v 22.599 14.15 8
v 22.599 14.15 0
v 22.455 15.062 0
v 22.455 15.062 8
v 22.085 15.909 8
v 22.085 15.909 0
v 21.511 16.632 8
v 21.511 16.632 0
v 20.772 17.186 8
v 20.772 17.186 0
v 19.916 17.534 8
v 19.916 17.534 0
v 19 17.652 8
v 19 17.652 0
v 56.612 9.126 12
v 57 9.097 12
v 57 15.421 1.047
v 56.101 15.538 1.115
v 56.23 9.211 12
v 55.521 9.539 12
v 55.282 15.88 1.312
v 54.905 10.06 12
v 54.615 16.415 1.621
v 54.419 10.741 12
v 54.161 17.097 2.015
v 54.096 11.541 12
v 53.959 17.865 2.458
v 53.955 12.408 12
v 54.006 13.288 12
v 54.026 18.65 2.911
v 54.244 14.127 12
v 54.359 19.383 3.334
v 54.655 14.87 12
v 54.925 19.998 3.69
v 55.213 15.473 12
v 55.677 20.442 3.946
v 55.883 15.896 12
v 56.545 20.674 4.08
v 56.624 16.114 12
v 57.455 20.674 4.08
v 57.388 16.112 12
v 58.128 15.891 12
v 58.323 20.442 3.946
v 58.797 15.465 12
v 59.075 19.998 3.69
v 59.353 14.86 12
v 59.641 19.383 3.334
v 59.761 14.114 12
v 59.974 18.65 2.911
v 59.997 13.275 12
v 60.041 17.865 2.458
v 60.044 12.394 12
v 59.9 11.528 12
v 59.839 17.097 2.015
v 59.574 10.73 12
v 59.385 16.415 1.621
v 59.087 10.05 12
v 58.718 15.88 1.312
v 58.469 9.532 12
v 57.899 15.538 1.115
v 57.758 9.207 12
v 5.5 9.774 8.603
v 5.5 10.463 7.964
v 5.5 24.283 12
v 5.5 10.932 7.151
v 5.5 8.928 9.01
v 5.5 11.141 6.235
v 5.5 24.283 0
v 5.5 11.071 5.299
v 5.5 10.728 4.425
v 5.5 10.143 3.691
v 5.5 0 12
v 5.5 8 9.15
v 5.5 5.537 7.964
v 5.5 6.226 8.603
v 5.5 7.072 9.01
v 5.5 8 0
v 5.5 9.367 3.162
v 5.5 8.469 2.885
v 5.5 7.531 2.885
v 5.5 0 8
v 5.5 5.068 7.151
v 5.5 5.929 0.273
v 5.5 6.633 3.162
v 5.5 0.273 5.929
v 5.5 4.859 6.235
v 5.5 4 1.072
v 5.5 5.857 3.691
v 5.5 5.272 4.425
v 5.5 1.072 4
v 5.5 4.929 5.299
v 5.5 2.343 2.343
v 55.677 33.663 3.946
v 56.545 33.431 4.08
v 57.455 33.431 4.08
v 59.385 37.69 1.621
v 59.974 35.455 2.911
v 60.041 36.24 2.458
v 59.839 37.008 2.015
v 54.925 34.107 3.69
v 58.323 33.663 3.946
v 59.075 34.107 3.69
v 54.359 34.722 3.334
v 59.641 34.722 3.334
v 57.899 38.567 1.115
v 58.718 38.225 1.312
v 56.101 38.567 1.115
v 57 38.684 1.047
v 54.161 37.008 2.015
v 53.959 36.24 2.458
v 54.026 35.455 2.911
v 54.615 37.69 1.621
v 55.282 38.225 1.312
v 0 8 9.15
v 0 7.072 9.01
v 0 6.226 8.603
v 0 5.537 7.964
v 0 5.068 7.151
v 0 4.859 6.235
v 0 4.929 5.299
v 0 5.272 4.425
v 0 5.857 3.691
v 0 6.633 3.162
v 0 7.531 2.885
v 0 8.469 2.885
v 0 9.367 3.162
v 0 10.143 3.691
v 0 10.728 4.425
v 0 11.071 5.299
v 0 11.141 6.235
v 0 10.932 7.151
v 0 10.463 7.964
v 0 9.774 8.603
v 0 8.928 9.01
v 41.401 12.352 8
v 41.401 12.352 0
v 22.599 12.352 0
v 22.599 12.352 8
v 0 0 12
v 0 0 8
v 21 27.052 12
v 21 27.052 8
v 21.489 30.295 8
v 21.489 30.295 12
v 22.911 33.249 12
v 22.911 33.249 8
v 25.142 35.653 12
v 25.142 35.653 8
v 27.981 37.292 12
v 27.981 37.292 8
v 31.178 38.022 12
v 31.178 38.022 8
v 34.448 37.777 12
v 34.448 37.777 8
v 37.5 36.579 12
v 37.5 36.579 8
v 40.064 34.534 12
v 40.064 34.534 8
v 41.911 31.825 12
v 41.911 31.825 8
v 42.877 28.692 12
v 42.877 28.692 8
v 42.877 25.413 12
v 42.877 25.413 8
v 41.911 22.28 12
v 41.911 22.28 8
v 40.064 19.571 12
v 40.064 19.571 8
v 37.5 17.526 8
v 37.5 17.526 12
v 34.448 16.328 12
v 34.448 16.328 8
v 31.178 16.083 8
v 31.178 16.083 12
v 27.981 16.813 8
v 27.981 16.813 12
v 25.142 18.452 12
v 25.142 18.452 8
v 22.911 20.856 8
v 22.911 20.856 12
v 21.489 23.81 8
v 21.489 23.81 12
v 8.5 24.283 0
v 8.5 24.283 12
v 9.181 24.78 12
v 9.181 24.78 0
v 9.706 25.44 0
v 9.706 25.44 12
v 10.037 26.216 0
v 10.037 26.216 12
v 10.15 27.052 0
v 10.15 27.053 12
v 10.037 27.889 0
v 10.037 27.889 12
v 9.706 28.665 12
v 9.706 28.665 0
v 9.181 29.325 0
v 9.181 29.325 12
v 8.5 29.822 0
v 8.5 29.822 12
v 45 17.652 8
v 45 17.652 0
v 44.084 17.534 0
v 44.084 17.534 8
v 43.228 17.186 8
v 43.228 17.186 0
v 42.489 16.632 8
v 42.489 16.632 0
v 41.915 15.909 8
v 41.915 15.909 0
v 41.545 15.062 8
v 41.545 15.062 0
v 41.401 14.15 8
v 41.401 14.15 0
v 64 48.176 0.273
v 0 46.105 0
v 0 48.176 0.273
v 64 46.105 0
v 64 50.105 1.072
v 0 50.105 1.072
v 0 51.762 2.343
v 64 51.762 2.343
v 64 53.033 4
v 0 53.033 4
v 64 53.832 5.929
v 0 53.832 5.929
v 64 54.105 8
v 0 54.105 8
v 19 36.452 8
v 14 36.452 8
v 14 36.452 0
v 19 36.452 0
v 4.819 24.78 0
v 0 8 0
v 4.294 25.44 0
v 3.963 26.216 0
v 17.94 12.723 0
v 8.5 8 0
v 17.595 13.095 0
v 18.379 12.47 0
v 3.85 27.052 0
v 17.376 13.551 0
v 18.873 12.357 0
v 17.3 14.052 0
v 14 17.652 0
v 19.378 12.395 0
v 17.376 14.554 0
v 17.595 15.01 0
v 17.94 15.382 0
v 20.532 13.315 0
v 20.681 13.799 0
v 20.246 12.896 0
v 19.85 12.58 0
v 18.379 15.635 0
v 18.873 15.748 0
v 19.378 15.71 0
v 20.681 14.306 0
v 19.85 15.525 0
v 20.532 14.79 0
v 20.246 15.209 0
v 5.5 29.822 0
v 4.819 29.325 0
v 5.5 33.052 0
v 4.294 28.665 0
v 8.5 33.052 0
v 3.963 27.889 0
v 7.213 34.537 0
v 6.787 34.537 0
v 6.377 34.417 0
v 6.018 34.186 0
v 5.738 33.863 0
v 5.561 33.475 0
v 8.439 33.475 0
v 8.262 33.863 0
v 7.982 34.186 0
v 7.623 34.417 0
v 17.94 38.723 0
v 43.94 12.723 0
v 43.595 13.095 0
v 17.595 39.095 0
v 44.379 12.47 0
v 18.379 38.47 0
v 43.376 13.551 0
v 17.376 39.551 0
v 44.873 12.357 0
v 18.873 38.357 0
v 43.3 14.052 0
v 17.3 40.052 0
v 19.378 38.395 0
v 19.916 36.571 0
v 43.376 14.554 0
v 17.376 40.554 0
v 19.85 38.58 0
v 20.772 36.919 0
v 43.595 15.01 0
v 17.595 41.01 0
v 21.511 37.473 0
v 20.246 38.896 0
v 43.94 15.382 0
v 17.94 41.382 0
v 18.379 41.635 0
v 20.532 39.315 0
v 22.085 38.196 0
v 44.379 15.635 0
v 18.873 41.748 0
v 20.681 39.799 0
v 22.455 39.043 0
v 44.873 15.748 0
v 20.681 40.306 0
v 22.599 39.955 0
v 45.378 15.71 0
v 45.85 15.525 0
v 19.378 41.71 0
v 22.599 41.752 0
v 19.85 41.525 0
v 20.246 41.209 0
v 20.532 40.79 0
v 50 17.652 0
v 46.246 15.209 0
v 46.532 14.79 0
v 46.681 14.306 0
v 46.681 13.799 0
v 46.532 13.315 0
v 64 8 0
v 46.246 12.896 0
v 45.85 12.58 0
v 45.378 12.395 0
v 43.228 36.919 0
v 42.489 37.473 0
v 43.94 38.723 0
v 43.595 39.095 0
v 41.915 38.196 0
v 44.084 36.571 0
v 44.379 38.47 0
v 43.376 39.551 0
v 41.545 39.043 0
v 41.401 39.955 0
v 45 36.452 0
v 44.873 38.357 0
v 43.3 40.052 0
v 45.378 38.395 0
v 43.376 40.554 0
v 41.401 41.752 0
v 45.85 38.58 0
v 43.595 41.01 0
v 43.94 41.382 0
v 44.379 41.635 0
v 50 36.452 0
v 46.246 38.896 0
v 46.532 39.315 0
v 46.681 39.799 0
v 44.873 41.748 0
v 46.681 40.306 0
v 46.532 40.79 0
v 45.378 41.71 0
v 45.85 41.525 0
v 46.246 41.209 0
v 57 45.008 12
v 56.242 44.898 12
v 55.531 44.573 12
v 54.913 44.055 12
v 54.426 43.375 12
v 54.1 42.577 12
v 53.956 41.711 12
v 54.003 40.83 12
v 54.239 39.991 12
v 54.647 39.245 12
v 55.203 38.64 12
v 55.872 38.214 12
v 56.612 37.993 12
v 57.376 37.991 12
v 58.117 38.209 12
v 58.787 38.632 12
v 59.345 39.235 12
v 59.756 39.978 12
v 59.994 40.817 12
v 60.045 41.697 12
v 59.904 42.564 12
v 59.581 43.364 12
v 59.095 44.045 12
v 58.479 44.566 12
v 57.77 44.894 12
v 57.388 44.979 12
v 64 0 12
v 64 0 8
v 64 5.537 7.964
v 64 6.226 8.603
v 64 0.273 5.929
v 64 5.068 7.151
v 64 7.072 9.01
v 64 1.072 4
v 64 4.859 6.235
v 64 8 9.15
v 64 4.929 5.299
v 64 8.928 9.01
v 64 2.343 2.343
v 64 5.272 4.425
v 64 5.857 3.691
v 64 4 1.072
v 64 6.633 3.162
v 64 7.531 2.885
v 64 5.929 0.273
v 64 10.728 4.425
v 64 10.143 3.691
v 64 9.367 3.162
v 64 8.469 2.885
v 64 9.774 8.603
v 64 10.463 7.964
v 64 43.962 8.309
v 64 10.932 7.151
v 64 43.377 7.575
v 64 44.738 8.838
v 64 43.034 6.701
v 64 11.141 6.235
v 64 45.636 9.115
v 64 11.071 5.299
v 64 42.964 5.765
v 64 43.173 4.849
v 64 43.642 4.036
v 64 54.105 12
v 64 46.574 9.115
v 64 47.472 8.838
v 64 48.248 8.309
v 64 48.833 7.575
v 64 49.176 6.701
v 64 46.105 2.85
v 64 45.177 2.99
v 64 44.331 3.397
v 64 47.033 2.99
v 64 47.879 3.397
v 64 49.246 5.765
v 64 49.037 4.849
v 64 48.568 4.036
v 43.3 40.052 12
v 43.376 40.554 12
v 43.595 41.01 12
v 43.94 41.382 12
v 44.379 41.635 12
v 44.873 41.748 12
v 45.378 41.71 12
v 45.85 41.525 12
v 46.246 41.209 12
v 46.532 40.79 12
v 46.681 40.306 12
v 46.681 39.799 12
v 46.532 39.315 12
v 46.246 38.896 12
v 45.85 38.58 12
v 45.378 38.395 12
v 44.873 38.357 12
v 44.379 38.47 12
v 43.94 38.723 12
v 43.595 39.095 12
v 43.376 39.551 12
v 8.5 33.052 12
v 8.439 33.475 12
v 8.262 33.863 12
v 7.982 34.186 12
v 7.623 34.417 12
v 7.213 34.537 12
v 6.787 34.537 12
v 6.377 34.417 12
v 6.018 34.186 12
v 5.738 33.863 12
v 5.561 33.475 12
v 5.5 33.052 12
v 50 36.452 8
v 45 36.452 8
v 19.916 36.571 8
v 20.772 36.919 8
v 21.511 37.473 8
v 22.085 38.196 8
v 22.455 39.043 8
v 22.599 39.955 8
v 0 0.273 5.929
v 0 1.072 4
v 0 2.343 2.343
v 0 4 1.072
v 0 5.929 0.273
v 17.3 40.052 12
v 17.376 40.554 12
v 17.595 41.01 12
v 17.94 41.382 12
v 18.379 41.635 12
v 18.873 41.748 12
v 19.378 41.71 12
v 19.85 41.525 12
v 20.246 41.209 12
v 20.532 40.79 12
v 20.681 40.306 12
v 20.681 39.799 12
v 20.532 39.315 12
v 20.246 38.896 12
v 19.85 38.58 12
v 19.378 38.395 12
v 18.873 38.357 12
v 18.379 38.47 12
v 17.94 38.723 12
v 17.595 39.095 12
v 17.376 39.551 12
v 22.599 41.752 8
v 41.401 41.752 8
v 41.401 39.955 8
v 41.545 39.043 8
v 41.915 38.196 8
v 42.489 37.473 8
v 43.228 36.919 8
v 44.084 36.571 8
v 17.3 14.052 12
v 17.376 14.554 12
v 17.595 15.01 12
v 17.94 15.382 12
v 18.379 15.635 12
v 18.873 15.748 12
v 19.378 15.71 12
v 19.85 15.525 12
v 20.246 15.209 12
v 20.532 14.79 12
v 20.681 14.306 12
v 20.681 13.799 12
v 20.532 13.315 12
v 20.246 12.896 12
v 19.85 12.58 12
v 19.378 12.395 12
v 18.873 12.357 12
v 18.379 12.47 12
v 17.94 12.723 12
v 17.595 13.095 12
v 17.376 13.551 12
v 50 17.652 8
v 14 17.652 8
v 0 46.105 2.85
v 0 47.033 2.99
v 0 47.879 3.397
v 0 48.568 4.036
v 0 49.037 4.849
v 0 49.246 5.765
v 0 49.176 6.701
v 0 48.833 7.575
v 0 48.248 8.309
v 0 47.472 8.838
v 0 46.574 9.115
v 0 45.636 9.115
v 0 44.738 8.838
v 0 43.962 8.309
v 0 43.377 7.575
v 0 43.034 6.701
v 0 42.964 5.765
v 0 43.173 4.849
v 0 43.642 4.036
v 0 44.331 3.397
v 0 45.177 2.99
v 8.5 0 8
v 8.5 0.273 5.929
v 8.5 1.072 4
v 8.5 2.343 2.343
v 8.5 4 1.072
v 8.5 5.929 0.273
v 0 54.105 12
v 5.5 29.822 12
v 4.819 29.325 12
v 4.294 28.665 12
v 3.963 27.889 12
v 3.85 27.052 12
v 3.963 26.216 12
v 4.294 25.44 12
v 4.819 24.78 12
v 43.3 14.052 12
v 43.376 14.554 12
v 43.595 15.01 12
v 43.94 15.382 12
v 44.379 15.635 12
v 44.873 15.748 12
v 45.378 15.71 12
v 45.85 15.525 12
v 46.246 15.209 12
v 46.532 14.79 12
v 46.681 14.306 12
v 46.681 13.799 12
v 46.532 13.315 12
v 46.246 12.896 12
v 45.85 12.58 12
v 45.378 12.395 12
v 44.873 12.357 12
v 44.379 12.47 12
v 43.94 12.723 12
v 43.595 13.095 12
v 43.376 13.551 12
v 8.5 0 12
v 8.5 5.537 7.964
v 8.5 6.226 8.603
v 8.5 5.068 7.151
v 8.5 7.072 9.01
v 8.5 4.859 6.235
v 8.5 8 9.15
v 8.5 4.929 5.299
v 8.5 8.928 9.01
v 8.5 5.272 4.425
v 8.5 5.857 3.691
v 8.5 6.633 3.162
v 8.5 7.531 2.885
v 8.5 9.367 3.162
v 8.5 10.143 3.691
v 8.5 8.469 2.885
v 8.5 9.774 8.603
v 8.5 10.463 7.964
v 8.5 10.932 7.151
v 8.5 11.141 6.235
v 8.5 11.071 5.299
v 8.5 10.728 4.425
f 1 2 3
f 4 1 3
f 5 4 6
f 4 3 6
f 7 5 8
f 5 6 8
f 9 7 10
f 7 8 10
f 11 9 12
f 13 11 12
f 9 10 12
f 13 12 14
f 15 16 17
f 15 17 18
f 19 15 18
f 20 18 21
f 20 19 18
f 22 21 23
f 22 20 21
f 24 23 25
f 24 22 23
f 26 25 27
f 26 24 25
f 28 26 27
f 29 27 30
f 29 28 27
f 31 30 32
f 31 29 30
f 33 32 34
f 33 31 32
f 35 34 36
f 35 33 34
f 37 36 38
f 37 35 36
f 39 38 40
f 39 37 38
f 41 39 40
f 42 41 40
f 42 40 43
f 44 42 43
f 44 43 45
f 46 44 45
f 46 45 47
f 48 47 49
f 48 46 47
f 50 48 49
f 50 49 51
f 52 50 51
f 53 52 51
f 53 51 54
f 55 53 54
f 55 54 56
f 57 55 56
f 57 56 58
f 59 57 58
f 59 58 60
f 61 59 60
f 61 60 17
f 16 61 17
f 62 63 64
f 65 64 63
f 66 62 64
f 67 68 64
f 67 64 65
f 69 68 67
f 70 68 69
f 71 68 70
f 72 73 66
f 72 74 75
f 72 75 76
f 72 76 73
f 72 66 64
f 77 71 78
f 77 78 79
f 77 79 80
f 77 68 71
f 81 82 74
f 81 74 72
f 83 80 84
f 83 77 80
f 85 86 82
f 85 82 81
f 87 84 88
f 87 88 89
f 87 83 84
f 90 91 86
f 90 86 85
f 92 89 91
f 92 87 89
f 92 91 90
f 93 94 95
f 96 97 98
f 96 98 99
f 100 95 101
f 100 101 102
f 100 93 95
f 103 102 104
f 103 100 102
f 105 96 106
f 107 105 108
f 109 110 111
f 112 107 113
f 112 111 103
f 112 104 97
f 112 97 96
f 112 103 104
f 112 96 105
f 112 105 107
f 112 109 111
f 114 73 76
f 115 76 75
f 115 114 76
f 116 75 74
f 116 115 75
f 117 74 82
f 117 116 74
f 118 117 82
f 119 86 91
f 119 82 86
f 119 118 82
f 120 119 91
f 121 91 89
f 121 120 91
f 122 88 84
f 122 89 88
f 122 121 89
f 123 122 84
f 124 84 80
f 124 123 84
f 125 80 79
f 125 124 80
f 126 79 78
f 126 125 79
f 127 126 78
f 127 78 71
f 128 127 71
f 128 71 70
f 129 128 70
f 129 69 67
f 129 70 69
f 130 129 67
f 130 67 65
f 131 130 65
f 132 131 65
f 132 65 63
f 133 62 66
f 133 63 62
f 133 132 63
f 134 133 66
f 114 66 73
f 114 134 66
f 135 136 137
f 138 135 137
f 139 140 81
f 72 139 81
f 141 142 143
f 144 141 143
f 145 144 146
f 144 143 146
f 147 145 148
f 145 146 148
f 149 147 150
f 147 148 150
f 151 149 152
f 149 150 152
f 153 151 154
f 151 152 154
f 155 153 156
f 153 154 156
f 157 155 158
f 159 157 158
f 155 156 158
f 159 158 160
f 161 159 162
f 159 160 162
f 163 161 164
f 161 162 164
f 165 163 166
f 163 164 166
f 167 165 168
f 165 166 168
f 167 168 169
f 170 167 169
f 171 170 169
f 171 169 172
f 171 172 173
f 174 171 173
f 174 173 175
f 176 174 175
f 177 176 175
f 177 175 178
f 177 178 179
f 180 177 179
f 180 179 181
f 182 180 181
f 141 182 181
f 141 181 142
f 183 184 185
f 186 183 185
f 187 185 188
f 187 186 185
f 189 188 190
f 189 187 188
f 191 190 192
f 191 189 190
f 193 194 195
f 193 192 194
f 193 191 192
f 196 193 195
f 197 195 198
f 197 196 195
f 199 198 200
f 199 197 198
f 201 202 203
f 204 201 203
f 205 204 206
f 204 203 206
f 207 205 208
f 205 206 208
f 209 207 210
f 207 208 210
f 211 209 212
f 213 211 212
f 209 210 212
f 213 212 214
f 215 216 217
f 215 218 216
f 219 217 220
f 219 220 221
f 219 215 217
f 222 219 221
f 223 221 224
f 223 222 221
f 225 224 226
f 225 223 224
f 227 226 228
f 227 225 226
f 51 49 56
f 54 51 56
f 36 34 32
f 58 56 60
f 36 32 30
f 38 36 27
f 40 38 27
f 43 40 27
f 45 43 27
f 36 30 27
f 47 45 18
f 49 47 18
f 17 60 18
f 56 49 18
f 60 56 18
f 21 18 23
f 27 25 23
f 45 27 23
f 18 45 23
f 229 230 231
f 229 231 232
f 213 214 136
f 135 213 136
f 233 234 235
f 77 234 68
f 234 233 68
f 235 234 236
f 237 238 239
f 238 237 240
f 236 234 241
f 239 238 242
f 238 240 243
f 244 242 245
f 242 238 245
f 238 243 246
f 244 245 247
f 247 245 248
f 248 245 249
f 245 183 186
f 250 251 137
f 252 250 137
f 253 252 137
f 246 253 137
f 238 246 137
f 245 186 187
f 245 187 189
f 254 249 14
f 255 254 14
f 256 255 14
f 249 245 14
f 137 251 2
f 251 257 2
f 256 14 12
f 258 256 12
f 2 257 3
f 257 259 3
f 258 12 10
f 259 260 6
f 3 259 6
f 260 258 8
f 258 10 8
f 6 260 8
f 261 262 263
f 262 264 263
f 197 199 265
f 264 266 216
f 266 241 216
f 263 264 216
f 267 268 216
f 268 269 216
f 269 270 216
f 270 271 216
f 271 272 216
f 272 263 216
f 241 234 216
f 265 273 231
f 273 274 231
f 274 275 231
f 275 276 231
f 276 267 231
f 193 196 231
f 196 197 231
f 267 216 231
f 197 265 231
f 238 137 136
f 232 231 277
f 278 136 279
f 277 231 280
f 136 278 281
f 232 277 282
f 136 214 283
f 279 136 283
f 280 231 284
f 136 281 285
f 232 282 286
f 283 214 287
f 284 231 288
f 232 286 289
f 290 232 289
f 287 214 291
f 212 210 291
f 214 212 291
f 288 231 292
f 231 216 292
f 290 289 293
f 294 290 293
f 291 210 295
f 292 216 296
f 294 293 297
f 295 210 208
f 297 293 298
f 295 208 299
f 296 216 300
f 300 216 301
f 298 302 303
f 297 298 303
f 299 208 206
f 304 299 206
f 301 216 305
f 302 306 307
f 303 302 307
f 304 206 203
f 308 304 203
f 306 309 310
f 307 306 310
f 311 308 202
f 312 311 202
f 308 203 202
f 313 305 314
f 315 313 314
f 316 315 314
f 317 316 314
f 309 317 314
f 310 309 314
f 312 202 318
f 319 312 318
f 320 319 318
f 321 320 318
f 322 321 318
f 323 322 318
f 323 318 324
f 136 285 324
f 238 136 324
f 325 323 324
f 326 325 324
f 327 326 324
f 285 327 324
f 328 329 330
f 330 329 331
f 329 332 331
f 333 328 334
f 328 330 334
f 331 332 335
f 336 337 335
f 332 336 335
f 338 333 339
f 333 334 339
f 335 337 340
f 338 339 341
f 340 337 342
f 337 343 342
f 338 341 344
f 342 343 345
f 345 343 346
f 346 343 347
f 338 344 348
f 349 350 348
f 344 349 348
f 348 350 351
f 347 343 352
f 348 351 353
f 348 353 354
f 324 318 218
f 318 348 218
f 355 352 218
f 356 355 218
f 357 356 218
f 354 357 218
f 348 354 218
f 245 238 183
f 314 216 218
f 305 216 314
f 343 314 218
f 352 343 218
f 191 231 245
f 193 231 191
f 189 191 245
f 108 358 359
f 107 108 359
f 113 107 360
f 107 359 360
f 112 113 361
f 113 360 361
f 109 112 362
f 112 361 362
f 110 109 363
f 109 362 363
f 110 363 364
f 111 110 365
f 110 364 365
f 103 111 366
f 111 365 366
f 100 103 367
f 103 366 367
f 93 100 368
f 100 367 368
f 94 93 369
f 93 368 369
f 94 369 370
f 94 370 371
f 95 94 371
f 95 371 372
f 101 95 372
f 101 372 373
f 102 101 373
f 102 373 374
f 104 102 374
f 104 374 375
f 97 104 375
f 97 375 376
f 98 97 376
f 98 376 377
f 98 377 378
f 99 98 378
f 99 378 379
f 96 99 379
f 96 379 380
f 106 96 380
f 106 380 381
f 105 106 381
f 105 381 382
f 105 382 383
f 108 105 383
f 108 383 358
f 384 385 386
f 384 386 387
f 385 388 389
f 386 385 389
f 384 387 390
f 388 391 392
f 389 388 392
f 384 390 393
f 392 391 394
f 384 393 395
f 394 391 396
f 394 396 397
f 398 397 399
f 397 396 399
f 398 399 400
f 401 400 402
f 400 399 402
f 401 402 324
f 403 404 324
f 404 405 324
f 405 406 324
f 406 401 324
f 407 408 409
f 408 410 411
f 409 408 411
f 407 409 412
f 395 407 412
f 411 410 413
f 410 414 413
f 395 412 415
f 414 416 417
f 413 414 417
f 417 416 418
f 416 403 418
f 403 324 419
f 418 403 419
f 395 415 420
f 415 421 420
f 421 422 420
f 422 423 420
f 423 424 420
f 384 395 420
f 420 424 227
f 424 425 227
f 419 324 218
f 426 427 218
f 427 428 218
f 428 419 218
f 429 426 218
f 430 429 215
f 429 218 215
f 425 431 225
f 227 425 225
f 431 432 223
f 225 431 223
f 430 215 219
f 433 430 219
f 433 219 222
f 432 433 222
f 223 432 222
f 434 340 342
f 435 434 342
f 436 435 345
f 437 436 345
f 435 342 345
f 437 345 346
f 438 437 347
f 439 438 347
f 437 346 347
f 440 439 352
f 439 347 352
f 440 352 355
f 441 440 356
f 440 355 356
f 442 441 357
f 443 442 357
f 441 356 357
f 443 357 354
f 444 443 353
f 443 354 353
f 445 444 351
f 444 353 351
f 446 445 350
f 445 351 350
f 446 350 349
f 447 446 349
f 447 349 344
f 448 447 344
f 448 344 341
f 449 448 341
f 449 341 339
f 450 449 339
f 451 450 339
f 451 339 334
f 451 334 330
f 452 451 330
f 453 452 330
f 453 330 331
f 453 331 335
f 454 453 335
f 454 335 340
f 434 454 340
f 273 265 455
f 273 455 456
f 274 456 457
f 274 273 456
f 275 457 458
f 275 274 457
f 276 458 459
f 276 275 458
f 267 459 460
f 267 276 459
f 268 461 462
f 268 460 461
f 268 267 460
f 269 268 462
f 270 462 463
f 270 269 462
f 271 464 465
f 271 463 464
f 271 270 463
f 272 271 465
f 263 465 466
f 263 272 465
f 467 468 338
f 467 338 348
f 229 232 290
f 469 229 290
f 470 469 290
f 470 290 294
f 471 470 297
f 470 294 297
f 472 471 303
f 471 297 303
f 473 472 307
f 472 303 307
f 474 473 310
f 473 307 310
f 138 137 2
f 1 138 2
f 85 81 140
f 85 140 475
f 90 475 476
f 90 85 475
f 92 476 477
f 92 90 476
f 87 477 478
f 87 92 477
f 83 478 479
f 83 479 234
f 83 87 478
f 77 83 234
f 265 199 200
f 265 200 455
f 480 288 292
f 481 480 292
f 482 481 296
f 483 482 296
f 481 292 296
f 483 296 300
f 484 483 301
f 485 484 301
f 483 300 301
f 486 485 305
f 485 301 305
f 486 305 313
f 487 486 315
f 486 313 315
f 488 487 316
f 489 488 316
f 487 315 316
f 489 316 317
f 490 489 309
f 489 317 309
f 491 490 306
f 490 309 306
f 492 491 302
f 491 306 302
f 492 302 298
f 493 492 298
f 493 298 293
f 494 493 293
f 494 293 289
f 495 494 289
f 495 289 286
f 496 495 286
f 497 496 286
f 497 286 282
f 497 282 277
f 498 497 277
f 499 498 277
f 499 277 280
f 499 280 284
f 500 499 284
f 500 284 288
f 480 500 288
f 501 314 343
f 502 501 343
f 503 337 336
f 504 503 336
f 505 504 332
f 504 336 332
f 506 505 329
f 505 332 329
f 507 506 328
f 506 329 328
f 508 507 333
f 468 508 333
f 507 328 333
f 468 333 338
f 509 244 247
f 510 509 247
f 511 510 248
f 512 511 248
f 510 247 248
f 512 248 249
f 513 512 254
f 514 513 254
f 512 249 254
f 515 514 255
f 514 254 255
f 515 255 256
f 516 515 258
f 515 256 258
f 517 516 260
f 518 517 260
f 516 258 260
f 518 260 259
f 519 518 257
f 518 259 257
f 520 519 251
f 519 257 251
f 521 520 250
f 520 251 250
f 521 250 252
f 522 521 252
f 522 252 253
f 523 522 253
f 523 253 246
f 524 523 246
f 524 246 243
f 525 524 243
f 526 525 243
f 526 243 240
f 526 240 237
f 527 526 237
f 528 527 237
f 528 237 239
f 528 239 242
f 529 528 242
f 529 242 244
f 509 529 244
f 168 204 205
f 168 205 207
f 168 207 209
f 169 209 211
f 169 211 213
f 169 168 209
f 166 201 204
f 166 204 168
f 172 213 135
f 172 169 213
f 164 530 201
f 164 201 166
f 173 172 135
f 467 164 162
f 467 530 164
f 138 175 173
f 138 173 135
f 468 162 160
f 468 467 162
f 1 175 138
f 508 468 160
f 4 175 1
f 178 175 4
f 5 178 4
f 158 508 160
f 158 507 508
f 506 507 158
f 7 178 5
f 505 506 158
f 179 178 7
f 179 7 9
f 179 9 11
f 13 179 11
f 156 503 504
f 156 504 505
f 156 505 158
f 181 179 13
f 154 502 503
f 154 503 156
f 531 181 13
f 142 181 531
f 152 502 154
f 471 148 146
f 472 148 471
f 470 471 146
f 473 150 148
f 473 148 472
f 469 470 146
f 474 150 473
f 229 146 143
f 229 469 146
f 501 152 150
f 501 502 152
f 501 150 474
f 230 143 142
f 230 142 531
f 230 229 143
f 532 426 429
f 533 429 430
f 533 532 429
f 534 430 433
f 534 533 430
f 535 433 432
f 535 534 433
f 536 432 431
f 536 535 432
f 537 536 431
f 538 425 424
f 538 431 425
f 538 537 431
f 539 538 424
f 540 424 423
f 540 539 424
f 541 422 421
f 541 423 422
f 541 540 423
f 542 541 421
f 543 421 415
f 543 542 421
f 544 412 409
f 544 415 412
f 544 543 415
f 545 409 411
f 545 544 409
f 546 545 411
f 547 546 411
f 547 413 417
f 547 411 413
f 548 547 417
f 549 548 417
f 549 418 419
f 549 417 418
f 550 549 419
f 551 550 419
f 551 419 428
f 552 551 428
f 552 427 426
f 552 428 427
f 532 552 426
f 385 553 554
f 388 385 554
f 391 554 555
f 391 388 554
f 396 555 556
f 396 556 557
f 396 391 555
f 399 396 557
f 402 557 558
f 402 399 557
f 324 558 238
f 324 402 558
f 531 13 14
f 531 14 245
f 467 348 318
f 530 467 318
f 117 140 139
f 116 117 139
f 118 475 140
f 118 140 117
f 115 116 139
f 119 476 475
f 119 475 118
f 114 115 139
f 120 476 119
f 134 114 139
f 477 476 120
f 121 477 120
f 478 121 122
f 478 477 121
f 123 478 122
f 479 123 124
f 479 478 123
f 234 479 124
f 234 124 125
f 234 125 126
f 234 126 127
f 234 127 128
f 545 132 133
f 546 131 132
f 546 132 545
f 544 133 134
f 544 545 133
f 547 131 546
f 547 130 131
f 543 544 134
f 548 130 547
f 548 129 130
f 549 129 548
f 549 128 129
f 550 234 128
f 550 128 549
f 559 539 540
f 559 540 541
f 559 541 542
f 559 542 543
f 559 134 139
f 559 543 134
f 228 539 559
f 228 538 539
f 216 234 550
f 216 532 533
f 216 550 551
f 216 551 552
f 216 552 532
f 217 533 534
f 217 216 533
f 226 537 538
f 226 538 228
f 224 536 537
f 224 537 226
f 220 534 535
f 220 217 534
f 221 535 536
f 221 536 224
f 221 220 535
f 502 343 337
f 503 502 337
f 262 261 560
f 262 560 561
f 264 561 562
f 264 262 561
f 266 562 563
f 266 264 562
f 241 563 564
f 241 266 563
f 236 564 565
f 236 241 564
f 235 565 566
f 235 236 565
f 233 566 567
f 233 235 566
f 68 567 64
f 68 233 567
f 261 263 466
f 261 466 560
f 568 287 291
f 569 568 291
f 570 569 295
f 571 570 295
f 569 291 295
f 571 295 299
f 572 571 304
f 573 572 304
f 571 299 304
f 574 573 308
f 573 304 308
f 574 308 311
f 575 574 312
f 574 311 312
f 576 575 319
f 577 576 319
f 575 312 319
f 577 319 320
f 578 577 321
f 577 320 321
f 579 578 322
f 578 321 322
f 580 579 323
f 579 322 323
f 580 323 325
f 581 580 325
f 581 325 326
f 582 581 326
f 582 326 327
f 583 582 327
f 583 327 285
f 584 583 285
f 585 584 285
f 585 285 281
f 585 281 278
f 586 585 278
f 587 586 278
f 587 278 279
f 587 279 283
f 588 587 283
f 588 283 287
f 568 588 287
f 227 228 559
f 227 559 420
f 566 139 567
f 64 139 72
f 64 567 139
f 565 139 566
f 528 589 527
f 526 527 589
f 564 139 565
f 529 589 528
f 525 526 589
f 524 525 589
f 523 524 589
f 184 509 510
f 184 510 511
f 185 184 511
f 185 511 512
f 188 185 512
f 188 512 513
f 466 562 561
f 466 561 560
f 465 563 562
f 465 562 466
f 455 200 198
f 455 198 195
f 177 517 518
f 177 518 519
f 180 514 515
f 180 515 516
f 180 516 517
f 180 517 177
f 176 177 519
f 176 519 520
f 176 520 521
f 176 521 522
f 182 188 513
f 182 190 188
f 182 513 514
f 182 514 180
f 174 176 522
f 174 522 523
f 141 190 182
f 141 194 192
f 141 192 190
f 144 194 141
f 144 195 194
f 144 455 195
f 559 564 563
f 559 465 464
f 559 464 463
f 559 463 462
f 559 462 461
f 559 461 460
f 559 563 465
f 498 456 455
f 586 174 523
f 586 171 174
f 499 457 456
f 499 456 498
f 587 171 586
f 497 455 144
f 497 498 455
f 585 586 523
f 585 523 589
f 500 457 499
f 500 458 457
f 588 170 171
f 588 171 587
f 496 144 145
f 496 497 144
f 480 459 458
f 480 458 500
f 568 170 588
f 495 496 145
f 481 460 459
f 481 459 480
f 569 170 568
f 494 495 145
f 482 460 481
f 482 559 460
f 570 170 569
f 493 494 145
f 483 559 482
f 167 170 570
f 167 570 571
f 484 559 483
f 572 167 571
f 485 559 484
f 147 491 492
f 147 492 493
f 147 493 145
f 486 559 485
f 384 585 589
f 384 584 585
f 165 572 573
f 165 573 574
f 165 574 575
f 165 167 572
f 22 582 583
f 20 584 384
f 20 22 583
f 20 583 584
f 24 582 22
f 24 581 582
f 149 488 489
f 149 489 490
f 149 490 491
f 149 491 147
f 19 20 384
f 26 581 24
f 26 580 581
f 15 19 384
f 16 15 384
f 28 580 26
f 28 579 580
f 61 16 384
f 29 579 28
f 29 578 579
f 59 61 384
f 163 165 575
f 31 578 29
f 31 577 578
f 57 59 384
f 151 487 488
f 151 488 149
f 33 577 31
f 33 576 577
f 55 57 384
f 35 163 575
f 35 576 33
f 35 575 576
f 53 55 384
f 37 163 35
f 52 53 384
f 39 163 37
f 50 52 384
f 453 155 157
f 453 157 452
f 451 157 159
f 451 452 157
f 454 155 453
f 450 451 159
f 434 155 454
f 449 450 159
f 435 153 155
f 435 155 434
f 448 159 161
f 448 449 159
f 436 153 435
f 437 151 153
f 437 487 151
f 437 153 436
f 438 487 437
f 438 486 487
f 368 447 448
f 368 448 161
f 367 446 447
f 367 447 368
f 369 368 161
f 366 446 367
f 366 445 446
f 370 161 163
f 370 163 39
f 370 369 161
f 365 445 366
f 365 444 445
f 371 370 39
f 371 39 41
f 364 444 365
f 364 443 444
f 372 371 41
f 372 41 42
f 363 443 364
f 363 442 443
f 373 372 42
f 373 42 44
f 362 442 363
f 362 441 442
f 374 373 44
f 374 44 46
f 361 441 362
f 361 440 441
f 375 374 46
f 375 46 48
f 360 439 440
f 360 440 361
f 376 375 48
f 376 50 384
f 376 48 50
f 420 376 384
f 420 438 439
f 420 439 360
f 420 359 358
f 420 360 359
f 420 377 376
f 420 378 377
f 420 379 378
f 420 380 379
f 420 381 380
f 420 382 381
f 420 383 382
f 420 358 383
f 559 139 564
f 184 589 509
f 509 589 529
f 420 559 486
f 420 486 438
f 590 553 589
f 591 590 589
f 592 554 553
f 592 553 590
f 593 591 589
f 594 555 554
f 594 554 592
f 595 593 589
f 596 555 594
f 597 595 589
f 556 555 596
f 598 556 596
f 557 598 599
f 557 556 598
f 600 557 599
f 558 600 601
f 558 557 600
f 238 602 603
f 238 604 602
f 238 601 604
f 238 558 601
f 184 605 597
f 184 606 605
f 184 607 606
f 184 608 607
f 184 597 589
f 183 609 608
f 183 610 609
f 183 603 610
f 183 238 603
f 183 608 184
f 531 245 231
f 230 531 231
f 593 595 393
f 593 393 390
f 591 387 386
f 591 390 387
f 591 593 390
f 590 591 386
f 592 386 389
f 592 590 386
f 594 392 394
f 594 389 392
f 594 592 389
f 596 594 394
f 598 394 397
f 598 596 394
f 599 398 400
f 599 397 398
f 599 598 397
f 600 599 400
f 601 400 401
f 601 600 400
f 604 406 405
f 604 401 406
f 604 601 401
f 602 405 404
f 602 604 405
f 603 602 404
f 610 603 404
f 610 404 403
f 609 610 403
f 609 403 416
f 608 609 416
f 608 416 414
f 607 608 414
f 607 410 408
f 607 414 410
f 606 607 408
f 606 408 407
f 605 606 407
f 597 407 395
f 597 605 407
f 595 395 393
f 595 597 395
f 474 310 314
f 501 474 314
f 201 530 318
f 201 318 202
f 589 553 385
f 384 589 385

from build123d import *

# Parameters (mm, degrees)
SKETCH1_W           = 64
SKETCH1_H           = 54.105
BOSS_EXTRUDE1_DEPTH = 12
SKETCH2_R           = 3.15
CUT_EXTRUDE1_DEPTH  = 85.660209219
FILLET1_R           = 8
SKETCH3_R           = 11
SKETCH3_R_2         = 1.7
CUT_EXTRUDE2_DEPTH  = 85.660209219
CUT_EXTRUDE4_DEPTH  = 8
CUT_EXTRUDE5_START  = -85.903698808
SKETCH6_R           = 3.05
CUT_EXTRUDE5_DEPTH  = 93.903698808


with BuildPart() as part:
    # Sketch1 → Boss-Extrude1 (new body)
    with BuildSketch(Plane.XY):
        with Locations((32, 27.0525)):
            Rectangle(SKETCH1_W, SKETCH1_H)
    extrude(amount=BOSS_EXTRUDE1_DEPTH)

    # Sketch2 → Cut-Extrude1 (cut, through all)
    with BuildSketch(Plane(origin=(0, 0, 0), x_dir=(0, 0, -1), z_dir=(1, 0, 0))):
        with Locations((-6, 46.105)):
            Circle(SKETCH2_R)
        with Locations(Location((-6, 8, 0), (0, 0, 180))):
            Circle(SKETCH2_R)
    extrude(amount=CUT_EXTRUDE1_DEPTH, mode=Mode.SUBTRACT)

    # Fillet1
    fillet1_edges = [part.edges().sort_by_distance(p)[0] for p in [
        (32, 54.105, 0),
        (32, 0, 0),
    ]]
    fillet(fillet1_edges, radius=FILLET1_R)

    # Sketch3 → Cut-Extrude2 (cut, through all)
    with BuildSketch(Plane(origin=(0, 0, 0), x_dir=(-1, 0, 0), z_dir=(0, 0, -1))):
        with Locations((-32, 27.0525)):
            Circle(SKETCH3_R)
        with Locations((-19, 40.0525)):
            Circle(SKETCH3_R_2)
        with Locations((-19, 14.0525)):
            Circle(SKETCH3_R_2)
        with Locations((-45, 14.0525)):
            Circle(SKETCH3_R_2)
        with Locations((-45, 40.0525)):
            Circle(SKETCH3_R_2)
        with BuildLine():
            Line((-8.5, 0), (-8.5, 24.282572203))
            ThreePointArc((-8.5, 24.282572203), (-10.15, 27.0525), (-8.5, 29.822427797))
            Line((-8.5, 29.822427797), (-8.5, 33.0525))
            ThreePointArc((-8.5, 33.0525), (-7, 34.5525), (-5.5, 33.0525))
            Line((-5.5, 33.0525), (-5.5, 29.822427797))
            ThreePointArc((-5.5, 29.822427797), (-3.85, 27.0525), (-5.5, 24.282572203))
            Line((-5.5, 24.282572203), (-5.5, 0))
            Line((-5.5, 0), (-8.5, 0))
        make_face()
    extrude(amount=-CUT_EXTRUDE2_DEPTH, mode=Mode.SUBTRACT)

    # Sketch5 → Cut-Extrude4 (cut)
    with BuildSketch(Plane(origin=(0, 0, 0), x_dir=(-1, 0, 0), z_dir=(0, 0, -1))):
        with BuildLine():
            Line((-19, 17.6525), (-14, 17.6525))
            Line((-14, 17.6525), (-14, 36.4525))
            Line((-14, 36.4525), (-19, 36.4525))
            ThreePointArc((-19, 36.4525), (-21.510876341, 37.472674425), (-22.598679445, 39.955))
            Line((-22.598679445, 39.955), (-22.598679445, 41.7525))
            Line((-22.598679445, 41.7525), (-41.401320555, 41.7525))
            Line((-41.401320555, 41.7525), (-41.401320555, 39.955))
            ThreePointArc((-41.401320555, 39.955), (-42.489123659, 37.472674425), (-45, 36.4525))
            Line((-45, 36.4525), (-50, 36.4525))
            Line((-50, 36.4525), (-50, 17.6525))
            Line((-50, 17.6525), (-45, 17.6525))
            ThreePointArc((-45, 17.6525), (-42.489123659, 16.632325575), (-41.401320555, 14.15))
            Line((-41.401320555, 14.15), (-41.401320555, 12.3525))
            Line((-41.401320555, 12.3525), (-22.598679445, 12.3525))
            Line((-22.598679445, 12.3525), (-22.598679445, 14.15))
            ThreePointArc((-22.598679445, 14.15), (-21.510876341, 16.632325575), (-19, 17.6525))
        make_face()
    extrude(amount=-CUT_EXTRUDE4_DEPTH, mode=Mode.SUBTRACT)

    # Sketch6 → Cut-Extrude5 (cut)
    with BuildSketch(Plane(origin=(0, -0.598076211, 1.035898385), x_dir=(1, 0, 0), z_dir=(0, 0.49999999999999495, -0.8660254037844416)).offset(CUT_EXTRUDE5_START)):
        with Locations(Location((57, -16.92820323, 0), (0, 0, 90))):
            Circle(SKETCH6_R)
    cut_extrude5 = extrude(amount=CUT_EXTRUDE5_DEPTH, mode=Mode.SUBTRACT)

    # Mirror1: Cut-Extrude5 across plane
    add(cut_extrude5.mirror(Plane.ZX.offset(27.0525)), mode=Mode.SUBTRACT)


solid = part.part
